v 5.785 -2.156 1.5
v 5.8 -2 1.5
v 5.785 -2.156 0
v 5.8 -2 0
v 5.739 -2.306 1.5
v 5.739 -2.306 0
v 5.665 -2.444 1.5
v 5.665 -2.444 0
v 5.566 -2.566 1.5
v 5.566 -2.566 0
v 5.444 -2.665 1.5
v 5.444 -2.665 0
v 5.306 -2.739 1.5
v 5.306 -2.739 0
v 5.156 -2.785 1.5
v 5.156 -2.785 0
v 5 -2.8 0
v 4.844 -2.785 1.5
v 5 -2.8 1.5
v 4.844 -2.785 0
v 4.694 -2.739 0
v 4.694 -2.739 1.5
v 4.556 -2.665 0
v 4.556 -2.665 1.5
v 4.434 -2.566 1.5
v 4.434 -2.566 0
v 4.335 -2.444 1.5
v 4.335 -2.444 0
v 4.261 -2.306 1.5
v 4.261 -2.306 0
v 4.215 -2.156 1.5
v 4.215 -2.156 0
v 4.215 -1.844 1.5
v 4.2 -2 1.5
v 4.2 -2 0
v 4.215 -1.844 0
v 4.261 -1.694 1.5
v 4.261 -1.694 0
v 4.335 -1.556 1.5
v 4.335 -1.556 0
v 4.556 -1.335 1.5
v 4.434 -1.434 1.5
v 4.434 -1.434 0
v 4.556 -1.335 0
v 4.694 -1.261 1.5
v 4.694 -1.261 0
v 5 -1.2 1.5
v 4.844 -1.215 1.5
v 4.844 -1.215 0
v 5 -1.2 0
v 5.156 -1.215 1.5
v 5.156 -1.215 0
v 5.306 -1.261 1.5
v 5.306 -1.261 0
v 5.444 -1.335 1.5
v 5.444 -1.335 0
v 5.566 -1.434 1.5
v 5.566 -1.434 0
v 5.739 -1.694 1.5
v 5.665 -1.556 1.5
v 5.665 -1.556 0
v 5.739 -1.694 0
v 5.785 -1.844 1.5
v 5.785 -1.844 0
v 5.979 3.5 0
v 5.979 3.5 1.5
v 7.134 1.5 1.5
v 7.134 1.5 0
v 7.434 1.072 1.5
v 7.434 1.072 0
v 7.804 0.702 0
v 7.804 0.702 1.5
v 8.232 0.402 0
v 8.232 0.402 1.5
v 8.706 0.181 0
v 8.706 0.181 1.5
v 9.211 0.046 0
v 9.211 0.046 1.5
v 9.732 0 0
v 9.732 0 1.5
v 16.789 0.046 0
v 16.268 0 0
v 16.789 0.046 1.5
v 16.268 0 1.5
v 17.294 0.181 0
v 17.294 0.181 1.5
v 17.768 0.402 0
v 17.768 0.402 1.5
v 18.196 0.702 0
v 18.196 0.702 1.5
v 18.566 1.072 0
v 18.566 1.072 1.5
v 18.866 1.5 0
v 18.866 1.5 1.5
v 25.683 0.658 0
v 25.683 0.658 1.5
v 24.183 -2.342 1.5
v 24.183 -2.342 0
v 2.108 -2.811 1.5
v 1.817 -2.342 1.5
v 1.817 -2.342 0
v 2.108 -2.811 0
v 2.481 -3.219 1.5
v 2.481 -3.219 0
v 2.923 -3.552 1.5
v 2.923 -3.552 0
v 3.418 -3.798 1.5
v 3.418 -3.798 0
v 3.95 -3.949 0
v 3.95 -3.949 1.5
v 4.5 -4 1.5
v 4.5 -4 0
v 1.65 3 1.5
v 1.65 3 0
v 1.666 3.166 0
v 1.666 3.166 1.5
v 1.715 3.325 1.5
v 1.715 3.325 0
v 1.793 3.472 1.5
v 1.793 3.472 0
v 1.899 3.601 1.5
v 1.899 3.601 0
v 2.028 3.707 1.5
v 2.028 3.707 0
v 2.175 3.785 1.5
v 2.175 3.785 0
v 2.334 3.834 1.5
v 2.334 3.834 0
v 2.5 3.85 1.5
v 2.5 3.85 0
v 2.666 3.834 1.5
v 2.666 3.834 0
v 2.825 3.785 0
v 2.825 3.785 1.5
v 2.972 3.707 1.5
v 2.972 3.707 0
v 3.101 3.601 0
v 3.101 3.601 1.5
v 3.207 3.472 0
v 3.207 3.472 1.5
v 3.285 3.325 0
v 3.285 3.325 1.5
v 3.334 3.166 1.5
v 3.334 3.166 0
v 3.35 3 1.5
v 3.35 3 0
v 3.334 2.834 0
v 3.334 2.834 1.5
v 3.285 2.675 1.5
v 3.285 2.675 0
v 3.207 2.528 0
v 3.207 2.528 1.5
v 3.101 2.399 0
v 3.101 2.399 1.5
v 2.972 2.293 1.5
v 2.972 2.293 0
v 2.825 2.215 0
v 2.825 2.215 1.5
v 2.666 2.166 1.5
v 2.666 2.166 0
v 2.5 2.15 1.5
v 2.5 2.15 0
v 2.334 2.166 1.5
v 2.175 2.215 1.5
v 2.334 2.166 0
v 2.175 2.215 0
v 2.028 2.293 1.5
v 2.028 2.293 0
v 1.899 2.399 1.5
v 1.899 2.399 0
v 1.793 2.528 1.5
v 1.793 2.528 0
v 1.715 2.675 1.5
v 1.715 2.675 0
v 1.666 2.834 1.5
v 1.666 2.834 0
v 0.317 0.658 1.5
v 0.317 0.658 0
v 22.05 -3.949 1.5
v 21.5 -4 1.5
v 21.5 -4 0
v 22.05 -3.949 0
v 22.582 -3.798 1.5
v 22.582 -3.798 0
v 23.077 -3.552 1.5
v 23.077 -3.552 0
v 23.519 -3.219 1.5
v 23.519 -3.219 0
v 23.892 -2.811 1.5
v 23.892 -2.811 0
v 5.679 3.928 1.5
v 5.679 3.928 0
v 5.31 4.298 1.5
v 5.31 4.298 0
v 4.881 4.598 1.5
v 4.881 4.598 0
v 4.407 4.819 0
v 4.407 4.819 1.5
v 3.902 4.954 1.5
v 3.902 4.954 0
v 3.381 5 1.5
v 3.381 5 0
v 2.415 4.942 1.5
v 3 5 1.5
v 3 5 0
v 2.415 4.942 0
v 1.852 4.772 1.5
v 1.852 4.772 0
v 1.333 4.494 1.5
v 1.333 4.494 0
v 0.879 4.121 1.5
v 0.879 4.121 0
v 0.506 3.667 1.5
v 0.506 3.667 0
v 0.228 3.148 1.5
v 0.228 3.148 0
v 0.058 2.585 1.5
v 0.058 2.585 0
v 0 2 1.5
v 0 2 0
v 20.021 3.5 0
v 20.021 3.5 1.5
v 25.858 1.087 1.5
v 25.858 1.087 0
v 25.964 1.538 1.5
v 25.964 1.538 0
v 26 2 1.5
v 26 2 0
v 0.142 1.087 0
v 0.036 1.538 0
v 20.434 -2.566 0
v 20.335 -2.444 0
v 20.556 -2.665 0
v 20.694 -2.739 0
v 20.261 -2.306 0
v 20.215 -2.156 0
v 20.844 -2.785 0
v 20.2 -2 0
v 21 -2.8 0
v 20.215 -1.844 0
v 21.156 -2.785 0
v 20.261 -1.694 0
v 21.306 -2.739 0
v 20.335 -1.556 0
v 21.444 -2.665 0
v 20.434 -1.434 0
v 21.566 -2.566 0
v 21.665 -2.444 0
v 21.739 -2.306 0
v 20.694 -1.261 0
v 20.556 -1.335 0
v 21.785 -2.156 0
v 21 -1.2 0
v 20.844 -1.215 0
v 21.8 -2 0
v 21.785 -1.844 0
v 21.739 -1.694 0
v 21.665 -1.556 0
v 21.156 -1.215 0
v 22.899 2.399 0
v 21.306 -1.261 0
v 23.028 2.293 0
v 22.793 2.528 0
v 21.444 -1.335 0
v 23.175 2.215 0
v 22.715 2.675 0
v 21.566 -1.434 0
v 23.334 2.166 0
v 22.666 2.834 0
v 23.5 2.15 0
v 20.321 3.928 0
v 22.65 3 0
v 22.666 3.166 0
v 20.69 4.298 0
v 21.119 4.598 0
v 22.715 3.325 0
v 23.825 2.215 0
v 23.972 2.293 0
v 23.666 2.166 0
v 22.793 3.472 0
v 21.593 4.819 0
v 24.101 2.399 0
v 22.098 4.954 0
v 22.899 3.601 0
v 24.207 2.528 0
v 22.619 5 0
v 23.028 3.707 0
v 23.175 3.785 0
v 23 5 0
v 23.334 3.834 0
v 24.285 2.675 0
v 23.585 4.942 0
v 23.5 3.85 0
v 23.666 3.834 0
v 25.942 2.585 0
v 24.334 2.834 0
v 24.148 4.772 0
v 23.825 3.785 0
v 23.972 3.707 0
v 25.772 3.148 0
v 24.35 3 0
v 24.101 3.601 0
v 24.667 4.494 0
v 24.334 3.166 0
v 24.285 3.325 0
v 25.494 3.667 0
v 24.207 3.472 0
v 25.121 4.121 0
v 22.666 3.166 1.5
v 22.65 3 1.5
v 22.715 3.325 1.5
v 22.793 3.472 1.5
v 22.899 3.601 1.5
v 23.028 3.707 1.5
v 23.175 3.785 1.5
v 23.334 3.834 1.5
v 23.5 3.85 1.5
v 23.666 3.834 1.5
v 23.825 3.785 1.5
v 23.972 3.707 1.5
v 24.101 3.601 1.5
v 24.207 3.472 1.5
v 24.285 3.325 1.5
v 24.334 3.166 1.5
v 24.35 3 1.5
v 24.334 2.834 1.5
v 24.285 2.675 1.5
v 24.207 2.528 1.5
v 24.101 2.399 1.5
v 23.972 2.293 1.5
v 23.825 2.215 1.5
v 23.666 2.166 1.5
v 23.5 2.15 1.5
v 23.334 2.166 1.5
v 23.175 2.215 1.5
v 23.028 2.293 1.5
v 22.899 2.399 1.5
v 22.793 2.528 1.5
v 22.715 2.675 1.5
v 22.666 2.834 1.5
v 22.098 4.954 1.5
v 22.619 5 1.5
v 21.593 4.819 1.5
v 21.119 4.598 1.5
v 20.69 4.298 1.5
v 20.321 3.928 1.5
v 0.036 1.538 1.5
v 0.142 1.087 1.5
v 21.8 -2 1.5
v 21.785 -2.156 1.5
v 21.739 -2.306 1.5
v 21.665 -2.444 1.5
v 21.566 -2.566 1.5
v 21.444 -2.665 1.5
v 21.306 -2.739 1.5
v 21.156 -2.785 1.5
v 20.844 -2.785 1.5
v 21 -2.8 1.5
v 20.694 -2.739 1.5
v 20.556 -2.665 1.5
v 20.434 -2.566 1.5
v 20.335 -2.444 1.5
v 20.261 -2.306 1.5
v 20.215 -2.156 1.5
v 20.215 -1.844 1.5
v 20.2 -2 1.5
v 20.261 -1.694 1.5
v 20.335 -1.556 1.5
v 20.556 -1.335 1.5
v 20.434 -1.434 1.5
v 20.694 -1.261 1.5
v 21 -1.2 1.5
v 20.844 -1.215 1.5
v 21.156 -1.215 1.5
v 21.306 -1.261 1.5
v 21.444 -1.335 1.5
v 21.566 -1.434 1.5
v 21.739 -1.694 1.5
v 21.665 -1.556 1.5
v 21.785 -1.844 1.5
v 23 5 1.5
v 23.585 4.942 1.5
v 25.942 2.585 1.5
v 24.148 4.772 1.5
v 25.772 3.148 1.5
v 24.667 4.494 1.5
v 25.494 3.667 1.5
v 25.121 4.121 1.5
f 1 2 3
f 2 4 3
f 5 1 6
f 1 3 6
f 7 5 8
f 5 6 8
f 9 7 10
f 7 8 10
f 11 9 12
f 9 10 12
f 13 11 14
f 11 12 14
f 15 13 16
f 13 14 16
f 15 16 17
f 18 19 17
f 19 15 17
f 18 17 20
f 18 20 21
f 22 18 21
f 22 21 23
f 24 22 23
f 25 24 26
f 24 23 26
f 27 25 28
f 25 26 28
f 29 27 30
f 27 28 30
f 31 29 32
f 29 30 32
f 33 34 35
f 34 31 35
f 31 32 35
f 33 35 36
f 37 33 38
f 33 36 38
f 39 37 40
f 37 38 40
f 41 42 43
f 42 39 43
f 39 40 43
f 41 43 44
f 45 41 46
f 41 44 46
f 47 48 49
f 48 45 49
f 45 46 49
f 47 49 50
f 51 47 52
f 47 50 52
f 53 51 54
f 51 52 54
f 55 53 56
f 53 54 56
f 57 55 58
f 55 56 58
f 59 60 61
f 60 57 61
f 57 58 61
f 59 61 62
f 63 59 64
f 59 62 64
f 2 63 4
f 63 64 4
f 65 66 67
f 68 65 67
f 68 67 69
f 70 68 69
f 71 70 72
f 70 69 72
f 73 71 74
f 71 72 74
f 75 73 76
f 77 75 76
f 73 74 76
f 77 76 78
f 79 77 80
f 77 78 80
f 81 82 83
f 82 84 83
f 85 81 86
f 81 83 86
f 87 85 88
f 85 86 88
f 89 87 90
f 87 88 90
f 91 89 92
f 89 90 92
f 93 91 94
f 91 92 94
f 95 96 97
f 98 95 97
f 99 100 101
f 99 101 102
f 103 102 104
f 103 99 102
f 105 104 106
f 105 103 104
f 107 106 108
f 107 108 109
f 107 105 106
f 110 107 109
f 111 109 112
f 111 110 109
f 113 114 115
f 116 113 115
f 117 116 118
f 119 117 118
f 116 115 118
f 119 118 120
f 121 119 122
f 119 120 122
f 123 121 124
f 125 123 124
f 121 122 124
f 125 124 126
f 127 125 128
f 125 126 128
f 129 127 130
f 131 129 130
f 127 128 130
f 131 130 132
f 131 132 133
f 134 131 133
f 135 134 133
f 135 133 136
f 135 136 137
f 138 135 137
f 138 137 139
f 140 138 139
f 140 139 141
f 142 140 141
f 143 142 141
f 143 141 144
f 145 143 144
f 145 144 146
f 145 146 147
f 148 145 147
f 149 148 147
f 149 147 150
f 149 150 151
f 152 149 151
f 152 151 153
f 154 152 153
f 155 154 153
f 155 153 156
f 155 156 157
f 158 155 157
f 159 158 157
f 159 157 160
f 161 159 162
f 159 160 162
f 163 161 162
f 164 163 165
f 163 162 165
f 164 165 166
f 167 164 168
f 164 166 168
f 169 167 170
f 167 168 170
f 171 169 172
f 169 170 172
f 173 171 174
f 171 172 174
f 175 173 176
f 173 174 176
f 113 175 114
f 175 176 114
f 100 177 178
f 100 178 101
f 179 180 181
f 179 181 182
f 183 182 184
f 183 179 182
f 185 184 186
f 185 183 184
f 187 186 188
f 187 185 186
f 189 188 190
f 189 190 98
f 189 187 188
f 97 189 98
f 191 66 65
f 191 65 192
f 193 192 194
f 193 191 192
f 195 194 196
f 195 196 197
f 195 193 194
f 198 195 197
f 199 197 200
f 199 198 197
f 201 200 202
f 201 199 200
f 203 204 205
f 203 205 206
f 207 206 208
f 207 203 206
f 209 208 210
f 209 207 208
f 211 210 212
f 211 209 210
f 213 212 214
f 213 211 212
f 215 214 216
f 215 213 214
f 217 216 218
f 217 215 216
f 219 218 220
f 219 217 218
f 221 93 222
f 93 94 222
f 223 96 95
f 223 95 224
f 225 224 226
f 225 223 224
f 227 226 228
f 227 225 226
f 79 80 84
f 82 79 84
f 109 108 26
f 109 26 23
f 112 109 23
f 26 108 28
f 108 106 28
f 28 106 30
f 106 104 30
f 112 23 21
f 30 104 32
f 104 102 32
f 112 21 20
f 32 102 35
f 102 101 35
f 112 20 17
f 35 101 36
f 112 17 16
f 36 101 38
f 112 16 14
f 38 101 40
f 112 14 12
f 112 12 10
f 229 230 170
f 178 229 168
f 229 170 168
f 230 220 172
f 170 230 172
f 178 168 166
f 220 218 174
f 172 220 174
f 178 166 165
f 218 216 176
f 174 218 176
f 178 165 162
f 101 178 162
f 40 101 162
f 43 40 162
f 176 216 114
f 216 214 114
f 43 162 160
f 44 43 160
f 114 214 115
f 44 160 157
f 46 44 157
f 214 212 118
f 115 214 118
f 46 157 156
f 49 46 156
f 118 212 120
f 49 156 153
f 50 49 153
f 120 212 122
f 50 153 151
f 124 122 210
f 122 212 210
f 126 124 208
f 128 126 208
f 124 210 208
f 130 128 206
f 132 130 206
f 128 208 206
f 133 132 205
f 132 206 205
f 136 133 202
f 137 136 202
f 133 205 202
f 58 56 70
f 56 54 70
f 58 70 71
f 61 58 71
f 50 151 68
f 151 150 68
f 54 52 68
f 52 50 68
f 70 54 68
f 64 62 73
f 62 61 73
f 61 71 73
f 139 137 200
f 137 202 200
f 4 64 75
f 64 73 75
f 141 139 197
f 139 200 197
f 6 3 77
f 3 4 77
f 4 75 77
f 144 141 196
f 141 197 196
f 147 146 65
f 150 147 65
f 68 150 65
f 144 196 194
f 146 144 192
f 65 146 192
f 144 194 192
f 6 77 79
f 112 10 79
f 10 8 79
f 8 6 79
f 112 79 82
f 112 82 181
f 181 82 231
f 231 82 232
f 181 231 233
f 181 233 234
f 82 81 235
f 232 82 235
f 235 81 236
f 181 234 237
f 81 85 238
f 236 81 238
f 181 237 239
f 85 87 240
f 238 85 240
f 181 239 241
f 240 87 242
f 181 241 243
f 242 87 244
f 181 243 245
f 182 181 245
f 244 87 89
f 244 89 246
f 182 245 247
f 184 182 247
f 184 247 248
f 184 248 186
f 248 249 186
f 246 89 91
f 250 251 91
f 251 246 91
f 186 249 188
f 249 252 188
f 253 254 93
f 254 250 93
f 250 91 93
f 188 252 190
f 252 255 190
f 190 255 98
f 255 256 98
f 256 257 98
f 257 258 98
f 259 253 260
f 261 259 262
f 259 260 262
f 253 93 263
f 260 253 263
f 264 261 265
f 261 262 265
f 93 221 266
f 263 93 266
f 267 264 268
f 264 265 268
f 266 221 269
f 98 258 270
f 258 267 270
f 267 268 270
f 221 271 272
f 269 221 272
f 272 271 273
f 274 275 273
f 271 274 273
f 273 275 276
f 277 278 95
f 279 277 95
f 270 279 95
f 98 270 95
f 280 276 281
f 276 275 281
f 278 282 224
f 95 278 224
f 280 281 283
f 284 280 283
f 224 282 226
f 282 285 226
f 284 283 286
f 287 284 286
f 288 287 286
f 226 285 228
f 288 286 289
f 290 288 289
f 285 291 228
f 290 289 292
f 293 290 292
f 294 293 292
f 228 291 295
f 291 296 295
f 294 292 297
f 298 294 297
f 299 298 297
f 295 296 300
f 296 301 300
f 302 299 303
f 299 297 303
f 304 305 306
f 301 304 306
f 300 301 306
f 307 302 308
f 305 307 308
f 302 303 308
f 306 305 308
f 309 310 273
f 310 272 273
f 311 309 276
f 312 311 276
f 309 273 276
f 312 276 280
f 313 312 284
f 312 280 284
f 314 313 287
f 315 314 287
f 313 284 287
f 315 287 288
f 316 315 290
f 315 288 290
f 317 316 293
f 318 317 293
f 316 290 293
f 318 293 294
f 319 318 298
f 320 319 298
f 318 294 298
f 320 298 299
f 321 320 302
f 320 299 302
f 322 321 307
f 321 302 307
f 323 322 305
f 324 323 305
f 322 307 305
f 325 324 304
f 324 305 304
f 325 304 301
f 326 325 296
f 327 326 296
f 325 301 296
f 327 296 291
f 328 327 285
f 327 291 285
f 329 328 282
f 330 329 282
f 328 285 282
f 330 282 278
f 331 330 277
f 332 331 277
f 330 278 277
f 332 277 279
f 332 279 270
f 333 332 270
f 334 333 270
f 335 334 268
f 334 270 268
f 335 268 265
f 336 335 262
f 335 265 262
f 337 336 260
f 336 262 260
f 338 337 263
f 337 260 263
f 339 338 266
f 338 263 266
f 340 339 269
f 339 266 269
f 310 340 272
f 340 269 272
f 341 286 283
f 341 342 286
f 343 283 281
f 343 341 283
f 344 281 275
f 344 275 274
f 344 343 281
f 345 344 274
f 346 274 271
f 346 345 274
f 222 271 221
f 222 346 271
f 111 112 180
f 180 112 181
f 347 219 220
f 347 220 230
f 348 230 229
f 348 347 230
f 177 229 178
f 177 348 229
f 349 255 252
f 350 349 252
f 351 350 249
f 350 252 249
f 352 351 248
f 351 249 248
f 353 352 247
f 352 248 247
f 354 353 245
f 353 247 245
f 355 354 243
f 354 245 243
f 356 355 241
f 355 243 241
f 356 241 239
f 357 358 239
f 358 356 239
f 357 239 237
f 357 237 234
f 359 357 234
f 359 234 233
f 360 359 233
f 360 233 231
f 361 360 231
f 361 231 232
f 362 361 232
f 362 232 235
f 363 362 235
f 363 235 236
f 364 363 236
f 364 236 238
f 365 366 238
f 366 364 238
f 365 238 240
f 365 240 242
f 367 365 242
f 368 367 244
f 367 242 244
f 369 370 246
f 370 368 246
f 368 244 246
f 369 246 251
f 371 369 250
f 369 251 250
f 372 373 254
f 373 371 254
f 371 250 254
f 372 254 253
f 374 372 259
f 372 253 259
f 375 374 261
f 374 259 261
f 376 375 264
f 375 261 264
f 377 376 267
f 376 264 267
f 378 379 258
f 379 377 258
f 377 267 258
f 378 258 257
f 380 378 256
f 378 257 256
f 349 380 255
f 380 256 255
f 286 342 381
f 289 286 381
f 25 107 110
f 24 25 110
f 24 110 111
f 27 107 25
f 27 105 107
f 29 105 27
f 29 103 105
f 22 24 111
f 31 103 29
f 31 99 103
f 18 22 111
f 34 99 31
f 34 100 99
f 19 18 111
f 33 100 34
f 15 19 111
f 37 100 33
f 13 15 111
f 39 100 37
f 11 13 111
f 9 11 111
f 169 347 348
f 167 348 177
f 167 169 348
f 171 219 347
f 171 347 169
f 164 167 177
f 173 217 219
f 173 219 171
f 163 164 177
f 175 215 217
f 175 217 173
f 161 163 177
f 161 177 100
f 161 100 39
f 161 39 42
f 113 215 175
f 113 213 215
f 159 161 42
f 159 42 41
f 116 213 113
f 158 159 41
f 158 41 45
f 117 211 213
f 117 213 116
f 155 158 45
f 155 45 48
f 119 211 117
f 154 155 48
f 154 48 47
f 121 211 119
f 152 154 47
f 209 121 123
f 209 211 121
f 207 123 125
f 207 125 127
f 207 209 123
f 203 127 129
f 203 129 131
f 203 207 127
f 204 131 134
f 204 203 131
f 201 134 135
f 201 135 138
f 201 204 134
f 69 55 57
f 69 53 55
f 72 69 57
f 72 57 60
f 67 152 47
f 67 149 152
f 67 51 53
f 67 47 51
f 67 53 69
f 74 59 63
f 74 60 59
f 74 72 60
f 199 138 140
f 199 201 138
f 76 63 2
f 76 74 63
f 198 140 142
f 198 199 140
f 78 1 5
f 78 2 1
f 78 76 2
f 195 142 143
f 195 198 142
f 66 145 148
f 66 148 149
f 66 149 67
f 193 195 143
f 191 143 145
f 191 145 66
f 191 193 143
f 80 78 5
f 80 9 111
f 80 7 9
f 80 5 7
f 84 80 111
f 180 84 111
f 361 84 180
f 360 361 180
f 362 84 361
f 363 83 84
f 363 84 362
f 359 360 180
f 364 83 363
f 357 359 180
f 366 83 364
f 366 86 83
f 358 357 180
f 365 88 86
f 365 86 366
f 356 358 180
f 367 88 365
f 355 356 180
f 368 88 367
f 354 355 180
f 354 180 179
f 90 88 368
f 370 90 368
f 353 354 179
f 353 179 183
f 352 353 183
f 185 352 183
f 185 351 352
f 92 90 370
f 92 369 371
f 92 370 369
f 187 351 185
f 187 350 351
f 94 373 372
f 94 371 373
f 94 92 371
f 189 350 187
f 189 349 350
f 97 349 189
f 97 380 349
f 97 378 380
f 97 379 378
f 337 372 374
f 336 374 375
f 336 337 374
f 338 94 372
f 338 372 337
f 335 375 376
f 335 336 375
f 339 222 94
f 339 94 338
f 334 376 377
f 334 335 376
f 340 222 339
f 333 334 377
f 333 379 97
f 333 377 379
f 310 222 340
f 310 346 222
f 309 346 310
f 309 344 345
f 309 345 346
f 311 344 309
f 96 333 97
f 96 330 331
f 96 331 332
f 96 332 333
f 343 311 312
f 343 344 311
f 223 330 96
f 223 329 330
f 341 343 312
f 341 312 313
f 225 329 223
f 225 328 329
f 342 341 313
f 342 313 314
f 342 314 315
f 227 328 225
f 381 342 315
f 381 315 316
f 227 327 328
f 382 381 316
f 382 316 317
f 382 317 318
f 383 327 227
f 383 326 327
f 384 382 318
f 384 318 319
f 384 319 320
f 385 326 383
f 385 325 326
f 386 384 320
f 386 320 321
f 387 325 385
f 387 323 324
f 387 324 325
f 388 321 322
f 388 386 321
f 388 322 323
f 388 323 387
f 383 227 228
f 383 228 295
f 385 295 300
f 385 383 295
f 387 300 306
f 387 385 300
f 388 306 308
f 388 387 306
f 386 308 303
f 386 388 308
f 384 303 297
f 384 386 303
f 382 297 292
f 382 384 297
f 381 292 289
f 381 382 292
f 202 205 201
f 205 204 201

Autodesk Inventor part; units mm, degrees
ref_plane "YZ Plane" through (0, 0, 0) normal (1, 0, 0) x (0, 1, 0)
ref_plane "XZ Plane" through (0, 0, 0) normal (0, 1, 0) x (-1, 0, 0)
ref_plane "XY Plane" through (0, 0, 0) normal (0, 0, 1) x (1, 0, 0)
sketch "スケッチ2" plane through (0, 0, 0) normal (0, 0, 1) x (1, 0, 0)
  line L0 (0, 0) -> (26, 0)
  line L1 (26, 0) -> (26, 33)
  line L2 (26, 33) -> (0, 33)
  line L3 (0, 33) -> (0, 0)
  line L4 (0, 0) -> (26, 0)
  line L5 (26, 0) -> (26, 24)
  line L6 (26, 24) -> (0, 24) construction
  line L7 (0, 24) -> (0, 0)
  circle A0 centre (13, 24) radius 13
  circle A1 centre (13, 24) radius 6.25
  line L8 (26, 0) -> (0, 0)
  line L9 (0, 0) -> (0, -4)
  line L10 (0, -4) -> (26, -4)
  line L11 (26, -4) -> (26, 0)
  circle A2 centre (21, -2) radius 0.8
  circle A3 centre (5, -2) radius 0.8
  point P0 (22.3808, 33)
  point P1 (3.6192, 33)
  point P2 (26, -2)
  dimension "d0" = 26
  dimension "d1" = 33
  dimension "d2" = 24
  dimension "d3" = 12.5
  dimension "d8" = 4
  dimension "d9" = 1.6
  dimension "d10" = 1.6
  dimension "d12" = 5
  dimension "d13" = 5
extrude "押し出し1" add sketch "スケッチ2" along normal blind 1.5 contours L3 A0 L1 L0 | L0 L11 L10 L9 | A0 L2 picked at (12.7489, 32.0681)
sketch "スケッチ3" plane through (0, 0, 0) normal (0, 0, -1) x (-1, 0, 0)
  circle A0 centre (-2.5, 24) radius 0.85 projected
  circle A1 centre (-23.5, 24) radius 0.85 projected
  circle A2 centre (-23.5, 3) radius 0.85 projected
  circle A3 centre (-2.5, 3) radius 0.85 projected
  point P0 (0, 0)
extrude "押し出し2" cut sketch "スケッチ3" against normal through all
fillet "フィレット1" radius 3 4 edges at (22.3808, 33, 0.75) (3.6192, 33, 0.75) (26, -4, 0.75) (0, -4, 0.75)
sketch "スケッチ4" plane through (0, 0, 1.5) normal (0, 0, 1) x (1, 0, 0)
  line L0 (0, 24) -> (0, -1) projected
  line L1 (0, 5) -> (26, 5)
  line L2 (26, 5) -> (26, 33)
  line L3 (26, 33) -> (0, 33)
  line L4 (0, 33) -> (0, 5)
  line L5 (21, 33) -> (5, 33) projected
  line L6 (26, -1) -> (26, 24) projected
  circle A0 centre (2.5, 3) radius 0.85 projected
  line L7 (5.1132, 5) -> (8, 0)
  line L8 (8, 0) -> (18, 0)
  line L9 (18, 0) -> (20.8868, 5)
  line L10 (0, 1.2918) -> (2.6459, -4)
  line L11 (3, -4) -> (23, -4) projected
  line L12 (26, 1.2918) -> (23.3541, -4)
  arc A1 (0, -1) -> (3, -4) centre (3, -1) ccw projected
  arc A2 (23, -4) -> (26, -1) centre (23, -1) ccw projected
  line L13 (2.5, 3) -> (5, -2)
  circle A3 centre (5, -2) radius 0.8 projected
  circle A4 centre (21, -2) radius 0.8 projected
  circle A5 centre (23.5, 3) radius 0.85 projected
  line L14 (23.5, 3) -> (21, -2)
  point P0 (0, 0)
  point P1 (13, 0)
  point P2 (13, 5)
  point P3 (23.3653, -3.9777)
  point P4 (2.6347, -3.9777)
  dimension "d15" = 2
  dimension "d16" = 10
  dimension "d17" = 5
  dimension "d18" = 120
  dimension "d19" = 120
  dimension "d24" = 3
  dimension "d25" = 3
extrude "切り取り1" cut sketch "スケッチ4" against normal blind 3.048 contours L4 L3 L2 L1 L0 | L1 L9 L8 L7
extrude "押し出し3" cut sketch "スケッチ4" against normal through all contours L10 A1 L0 | L6 A2 L12
fillet "フィレット3" radius 3 10 edges at (5.1132, 5, 0.75) (0, 5, 0.75) (8, 0, 0.75) (20.8868, 5, 0.75) (26, 5, 0.75) (26, 1.2918, 0.75) (18, 0, 0.75) (0, 1.2918, 0.75) (2.6347, -3.9777, 0.75) (23.3653, -3.9777, 0.75)
equation "\"d13\" = d12"
equation "\"d19\" = d18"
equation "\"d25\" = d24"
equation "\"d21\" = Thickness"
equation "\"BendRadius\" = Thickness"
equation "\"BendReliefWidth\" = Thickness"
equation "\"BendReliefDepth\" = 0.5 * Thickness"
equation "\"CornerReliefSize\" = 4 * Thickness"
equation "\"MinimumRemnant\" = 2 * Thickness"
equation "\"TransitionRadius\" = BendRadius"
equation "\"JacobiRadiusSize\" = BendRadius"
equation "\"GapSize\" = Thickness"
equation "\"d20\" = Thickness"
equation "\"Thickness\" = 3.048"
properties part number "upper_arm" material "アルミニウム 6061"
